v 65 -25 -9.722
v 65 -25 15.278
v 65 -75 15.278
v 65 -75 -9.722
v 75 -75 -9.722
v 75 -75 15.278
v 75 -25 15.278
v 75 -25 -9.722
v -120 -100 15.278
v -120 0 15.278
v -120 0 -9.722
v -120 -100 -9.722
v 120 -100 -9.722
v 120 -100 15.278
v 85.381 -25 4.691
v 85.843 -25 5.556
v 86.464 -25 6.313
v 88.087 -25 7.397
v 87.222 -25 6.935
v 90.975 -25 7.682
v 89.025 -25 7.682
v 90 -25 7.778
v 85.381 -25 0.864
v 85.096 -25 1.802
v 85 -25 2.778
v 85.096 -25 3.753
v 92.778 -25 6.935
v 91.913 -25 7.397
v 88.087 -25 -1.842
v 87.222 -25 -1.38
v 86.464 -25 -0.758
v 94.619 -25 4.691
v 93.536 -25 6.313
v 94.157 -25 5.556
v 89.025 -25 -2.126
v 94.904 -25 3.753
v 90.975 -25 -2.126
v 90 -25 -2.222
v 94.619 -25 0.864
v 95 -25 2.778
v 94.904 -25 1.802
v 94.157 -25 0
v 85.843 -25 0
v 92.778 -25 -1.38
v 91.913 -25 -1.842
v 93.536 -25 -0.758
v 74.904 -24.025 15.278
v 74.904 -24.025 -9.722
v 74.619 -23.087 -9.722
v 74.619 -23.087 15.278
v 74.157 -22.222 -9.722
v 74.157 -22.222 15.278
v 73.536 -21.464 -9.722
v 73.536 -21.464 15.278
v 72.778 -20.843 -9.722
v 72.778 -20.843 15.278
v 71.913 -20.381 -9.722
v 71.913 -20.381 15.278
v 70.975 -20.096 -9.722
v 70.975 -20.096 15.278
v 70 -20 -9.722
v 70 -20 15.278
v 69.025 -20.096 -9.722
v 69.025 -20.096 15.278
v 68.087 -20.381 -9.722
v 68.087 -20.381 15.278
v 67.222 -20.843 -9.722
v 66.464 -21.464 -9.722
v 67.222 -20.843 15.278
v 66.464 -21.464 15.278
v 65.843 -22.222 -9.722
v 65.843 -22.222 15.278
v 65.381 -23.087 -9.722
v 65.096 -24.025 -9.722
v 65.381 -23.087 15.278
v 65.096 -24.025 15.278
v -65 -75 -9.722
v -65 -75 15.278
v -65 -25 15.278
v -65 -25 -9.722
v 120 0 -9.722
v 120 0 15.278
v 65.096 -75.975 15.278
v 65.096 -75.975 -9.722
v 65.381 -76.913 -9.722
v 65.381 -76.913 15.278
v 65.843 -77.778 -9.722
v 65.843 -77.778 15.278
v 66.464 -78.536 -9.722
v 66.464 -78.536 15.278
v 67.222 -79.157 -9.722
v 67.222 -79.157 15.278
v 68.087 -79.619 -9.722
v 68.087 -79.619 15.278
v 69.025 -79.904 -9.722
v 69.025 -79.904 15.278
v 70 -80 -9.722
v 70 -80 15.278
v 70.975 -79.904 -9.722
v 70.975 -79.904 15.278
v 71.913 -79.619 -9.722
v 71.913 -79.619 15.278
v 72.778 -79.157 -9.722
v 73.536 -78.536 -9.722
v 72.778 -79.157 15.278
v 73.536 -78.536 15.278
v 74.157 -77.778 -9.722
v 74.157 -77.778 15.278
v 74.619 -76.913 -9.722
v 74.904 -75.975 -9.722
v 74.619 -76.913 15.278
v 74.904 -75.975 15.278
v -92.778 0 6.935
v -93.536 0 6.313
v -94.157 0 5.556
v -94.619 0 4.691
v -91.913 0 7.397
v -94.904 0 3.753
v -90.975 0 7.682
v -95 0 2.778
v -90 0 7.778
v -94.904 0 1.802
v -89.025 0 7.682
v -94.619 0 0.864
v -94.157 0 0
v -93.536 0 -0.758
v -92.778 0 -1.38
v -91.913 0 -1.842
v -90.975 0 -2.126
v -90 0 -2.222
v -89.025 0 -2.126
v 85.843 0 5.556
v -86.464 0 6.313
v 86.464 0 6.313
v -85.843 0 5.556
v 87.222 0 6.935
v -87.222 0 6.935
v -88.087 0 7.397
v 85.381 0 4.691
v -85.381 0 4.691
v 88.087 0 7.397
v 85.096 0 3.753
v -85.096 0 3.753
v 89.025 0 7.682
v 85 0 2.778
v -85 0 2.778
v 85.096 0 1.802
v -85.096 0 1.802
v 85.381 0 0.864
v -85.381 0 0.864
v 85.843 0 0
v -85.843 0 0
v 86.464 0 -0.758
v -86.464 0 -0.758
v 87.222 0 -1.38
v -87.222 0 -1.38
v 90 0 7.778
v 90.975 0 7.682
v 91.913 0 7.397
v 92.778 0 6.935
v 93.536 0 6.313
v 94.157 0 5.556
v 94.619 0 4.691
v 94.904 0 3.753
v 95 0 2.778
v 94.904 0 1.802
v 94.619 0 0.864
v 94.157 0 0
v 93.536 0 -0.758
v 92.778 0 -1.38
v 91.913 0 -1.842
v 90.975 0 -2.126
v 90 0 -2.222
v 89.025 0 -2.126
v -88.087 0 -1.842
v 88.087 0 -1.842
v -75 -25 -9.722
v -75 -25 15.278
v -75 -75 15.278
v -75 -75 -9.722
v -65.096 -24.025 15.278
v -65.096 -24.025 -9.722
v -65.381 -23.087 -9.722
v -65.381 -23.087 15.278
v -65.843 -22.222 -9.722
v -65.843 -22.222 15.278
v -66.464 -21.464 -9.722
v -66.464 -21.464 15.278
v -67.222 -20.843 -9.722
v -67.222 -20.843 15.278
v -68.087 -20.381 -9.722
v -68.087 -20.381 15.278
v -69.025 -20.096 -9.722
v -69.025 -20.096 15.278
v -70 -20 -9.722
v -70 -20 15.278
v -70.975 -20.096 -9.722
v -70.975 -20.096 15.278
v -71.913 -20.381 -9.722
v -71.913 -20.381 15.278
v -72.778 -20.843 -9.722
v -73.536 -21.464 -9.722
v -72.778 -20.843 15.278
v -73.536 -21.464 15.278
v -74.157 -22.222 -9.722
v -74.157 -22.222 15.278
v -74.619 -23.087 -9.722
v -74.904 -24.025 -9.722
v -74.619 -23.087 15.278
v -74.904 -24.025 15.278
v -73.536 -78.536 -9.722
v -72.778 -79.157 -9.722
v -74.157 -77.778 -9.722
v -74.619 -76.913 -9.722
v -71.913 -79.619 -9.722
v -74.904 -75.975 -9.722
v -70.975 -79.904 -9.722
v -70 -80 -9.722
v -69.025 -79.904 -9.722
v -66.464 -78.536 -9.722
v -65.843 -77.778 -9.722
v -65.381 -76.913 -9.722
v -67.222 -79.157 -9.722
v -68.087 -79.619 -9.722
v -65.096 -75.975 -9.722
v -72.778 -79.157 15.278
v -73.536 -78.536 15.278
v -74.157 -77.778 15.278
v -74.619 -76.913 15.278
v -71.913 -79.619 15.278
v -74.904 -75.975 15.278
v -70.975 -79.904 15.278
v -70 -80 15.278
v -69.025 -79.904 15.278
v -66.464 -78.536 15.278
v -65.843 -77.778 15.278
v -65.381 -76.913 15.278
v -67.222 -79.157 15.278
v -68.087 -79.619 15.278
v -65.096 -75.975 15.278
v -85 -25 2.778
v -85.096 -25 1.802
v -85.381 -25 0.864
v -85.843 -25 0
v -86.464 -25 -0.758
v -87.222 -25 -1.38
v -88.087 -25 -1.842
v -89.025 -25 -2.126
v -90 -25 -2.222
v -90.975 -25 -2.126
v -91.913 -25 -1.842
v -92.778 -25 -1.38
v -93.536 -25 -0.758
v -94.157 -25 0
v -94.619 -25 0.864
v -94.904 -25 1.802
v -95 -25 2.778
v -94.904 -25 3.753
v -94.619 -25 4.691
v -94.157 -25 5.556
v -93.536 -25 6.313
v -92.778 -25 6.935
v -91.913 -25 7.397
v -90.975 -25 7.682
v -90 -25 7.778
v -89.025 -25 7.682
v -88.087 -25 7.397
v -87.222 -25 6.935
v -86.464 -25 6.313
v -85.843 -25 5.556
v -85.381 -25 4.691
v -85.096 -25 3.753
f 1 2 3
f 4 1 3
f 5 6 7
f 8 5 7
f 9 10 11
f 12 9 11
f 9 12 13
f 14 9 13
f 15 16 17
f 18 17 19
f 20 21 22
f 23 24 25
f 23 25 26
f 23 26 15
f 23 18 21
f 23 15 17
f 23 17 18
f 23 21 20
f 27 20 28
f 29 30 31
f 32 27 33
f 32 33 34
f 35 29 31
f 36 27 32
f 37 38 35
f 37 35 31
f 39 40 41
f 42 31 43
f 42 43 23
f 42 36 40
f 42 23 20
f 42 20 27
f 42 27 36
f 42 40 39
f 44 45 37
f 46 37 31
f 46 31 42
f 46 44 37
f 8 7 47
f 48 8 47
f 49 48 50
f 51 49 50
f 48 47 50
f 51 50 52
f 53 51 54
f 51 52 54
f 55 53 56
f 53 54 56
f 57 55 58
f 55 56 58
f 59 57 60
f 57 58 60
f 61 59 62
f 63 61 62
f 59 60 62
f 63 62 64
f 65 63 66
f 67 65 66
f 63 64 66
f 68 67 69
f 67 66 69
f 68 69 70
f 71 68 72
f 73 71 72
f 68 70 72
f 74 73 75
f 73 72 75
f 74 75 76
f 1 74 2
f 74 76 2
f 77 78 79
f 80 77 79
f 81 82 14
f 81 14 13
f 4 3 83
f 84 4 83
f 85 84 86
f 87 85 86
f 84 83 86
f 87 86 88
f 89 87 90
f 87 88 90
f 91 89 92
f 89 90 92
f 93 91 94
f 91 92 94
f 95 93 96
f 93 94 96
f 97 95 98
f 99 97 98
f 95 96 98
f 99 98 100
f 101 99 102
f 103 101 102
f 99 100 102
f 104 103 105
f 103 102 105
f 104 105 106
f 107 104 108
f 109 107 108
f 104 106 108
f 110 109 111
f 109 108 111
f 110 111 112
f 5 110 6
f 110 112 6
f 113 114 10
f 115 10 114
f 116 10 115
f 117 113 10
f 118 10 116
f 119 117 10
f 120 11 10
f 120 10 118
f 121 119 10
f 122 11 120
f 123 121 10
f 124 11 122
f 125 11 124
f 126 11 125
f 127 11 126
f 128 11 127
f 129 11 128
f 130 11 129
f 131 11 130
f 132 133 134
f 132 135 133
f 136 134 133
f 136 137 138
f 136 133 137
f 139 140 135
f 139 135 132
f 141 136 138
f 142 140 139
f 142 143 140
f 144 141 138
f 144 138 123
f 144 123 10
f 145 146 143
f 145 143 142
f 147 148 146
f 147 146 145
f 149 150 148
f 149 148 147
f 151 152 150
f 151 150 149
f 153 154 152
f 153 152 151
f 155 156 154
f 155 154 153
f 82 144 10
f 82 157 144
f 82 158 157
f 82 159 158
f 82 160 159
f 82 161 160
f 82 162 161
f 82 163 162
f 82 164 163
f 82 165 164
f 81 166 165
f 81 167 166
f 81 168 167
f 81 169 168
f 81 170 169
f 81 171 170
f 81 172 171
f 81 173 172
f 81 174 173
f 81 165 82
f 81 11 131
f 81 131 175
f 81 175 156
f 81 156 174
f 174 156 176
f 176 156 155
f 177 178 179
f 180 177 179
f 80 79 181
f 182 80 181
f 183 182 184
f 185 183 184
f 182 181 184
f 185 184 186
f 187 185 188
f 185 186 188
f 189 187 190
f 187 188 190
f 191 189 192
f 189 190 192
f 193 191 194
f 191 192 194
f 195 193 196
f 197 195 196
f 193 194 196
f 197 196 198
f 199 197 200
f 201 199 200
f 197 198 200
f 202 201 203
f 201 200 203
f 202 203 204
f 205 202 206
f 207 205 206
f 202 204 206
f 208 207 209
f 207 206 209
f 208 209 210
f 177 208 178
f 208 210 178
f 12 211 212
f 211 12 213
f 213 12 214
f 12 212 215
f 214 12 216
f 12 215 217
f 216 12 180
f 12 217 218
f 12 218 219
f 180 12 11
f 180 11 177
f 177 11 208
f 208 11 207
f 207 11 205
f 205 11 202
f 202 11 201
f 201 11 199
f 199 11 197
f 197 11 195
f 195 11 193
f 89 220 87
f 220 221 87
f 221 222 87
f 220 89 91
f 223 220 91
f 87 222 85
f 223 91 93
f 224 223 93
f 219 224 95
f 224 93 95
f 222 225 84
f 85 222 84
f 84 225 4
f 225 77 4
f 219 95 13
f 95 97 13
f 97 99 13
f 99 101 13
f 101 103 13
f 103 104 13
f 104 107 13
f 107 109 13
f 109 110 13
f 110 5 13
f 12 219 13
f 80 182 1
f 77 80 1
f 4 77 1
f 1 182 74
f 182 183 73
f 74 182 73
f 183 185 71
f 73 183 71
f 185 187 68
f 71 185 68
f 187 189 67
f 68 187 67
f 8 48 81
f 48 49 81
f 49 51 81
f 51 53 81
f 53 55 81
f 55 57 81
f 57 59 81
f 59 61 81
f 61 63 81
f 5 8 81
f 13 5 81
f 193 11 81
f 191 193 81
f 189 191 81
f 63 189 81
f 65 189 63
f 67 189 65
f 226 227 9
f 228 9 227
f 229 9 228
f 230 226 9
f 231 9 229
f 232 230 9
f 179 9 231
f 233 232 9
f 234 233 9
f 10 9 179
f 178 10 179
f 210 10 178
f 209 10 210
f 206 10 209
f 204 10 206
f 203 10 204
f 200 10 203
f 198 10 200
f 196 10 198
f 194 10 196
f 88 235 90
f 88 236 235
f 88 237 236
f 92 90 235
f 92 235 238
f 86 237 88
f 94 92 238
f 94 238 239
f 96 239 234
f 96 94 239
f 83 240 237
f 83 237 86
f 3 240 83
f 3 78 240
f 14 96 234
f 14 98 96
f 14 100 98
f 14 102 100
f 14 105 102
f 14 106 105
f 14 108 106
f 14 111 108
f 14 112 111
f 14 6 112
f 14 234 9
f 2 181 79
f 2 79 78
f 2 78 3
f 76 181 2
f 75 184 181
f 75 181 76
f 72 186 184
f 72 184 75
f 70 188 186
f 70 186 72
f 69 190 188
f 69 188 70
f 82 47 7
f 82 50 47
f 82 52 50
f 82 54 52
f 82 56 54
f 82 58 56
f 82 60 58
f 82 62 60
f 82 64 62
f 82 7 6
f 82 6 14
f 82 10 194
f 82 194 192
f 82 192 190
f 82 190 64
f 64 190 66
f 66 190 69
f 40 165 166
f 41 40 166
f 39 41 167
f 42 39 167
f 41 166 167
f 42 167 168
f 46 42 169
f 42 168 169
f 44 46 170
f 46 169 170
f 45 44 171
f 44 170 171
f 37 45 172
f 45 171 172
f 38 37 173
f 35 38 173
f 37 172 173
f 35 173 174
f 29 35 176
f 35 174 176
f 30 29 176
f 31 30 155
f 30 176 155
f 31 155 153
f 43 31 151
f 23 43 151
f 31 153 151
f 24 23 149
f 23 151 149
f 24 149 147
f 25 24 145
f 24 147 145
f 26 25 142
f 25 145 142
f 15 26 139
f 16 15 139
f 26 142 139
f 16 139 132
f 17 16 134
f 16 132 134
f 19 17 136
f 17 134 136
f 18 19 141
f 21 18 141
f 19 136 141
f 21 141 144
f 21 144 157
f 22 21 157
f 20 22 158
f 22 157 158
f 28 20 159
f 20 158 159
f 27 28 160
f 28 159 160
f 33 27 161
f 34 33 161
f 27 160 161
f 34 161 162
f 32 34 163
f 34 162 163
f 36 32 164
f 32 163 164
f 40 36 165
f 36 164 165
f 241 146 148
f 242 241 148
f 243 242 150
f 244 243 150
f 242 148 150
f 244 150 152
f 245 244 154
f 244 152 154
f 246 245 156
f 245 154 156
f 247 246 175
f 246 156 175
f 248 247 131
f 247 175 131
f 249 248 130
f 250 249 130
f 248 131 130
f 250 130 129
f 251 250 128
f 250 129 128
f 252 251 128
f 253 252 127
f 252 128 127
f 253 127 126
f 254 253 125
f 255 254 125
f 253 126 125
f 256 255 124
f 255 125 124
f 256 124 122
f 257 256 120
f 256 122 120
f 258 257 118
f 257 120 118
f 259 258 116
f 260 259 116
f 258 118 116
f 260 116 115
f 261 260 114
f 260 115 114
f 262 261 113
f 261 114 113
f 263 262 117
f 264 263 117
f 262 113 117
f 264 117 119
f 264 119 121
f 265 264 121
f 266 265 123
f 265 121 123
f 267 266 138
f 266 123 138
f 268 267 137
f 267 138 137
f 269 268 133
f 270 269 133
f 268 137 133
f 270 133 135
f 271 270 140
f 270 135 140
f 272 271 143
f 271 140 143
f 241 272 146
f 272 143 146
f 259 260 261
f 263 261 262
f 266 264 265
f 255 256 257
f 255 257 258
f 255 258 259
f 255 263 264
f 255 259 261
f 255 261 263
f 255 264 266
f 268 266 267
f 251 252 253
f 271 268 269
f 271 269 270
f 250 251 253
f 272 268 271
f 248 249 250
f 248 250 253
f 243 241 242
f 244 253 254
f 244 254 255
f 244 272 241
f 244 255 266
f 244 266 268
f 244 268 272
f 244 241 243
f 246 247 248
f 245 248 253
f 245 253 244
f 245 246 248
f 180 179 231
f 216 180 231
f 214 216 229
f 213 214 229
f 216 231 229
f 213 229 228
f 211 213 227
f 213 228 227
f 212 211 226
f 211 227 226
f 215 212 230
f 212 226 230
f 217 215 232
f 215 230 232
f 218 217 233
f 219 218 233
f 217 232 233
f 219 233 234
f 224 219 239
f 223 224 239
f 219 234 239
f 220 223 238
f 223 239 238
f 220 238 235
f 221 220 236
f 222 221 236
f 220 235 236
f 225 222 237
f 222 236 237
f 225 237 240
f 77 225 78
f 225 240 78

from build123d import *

# Parameters (mm, degrees)
CROQUIS1_W              = 240
CROQUIS1_H              = 25
SALIENTE_EXTRUIR1_DEPTH = 100
CROQUIS3_R              = 5
CORTAR_EXTRUIR1_DEPTH   = 25
CORTAR_EXTRUIR2_DEPTH   = 25


with BuildPart() as part:
    # Croquis1 → Saliente-Extruir1 (new body)
    with BuildSketch(Plane(origin=(0, 0, 0), x_dir=(1, 0, 0), z_dir=(0, 1, 0))):
        with Locations((0, -2.777777778)):
            Rectangle(CROQUIS1_W, CROQUIS1_H)
    extrude(amount=-SALIENTE_EXTRUIR1_DEPTH)

    # Croquis3 → Cortar-Extruir1 (cut)
    with BuildSketch(Plane(origin=(0, 0, 0), x_dir=(1, 0, 0), z_dir=(0, 1, 0))):
        with Locations((-90, -2.777777778)):
            Circle(CROQUIS3_R)
        with Locations((90, -2.777777778)):
            Circle(CROQUIS3_R)
    extrude(amount=-CORTAR_EXTRUIR1_DEPTH, mode=Mode.SUBTRACT)

    # Croquis4 → Cortar-Extruir2 (cut)
    with BuildSketch(Plane.XY.offset(15.277777778)):
        with BuildLine():
            Line((-75, -25), (-75, -75))
            ThreePointArc((-75, -75), (-70, -80), (-65, -75))
            Line((-65, -75), (-65, -25))
            ThreePointArc((-65, -25), (-70, -20), (-75, -25))
        make_face()
        with BuildLine():
            Line((65, -25), (65, -75))
            ThreePointArc((65, -75), (70, -80), (75, -75))
            Line((75, -75), (75, -25))
            ThreePointArc((75, -25), (70, -20), (65, -25))
        make_face()
    extrude(amount=-CORTAR_EXTRUIR2_DEPTH, mode=Mode.SUBTRACT)


solid = part.part
